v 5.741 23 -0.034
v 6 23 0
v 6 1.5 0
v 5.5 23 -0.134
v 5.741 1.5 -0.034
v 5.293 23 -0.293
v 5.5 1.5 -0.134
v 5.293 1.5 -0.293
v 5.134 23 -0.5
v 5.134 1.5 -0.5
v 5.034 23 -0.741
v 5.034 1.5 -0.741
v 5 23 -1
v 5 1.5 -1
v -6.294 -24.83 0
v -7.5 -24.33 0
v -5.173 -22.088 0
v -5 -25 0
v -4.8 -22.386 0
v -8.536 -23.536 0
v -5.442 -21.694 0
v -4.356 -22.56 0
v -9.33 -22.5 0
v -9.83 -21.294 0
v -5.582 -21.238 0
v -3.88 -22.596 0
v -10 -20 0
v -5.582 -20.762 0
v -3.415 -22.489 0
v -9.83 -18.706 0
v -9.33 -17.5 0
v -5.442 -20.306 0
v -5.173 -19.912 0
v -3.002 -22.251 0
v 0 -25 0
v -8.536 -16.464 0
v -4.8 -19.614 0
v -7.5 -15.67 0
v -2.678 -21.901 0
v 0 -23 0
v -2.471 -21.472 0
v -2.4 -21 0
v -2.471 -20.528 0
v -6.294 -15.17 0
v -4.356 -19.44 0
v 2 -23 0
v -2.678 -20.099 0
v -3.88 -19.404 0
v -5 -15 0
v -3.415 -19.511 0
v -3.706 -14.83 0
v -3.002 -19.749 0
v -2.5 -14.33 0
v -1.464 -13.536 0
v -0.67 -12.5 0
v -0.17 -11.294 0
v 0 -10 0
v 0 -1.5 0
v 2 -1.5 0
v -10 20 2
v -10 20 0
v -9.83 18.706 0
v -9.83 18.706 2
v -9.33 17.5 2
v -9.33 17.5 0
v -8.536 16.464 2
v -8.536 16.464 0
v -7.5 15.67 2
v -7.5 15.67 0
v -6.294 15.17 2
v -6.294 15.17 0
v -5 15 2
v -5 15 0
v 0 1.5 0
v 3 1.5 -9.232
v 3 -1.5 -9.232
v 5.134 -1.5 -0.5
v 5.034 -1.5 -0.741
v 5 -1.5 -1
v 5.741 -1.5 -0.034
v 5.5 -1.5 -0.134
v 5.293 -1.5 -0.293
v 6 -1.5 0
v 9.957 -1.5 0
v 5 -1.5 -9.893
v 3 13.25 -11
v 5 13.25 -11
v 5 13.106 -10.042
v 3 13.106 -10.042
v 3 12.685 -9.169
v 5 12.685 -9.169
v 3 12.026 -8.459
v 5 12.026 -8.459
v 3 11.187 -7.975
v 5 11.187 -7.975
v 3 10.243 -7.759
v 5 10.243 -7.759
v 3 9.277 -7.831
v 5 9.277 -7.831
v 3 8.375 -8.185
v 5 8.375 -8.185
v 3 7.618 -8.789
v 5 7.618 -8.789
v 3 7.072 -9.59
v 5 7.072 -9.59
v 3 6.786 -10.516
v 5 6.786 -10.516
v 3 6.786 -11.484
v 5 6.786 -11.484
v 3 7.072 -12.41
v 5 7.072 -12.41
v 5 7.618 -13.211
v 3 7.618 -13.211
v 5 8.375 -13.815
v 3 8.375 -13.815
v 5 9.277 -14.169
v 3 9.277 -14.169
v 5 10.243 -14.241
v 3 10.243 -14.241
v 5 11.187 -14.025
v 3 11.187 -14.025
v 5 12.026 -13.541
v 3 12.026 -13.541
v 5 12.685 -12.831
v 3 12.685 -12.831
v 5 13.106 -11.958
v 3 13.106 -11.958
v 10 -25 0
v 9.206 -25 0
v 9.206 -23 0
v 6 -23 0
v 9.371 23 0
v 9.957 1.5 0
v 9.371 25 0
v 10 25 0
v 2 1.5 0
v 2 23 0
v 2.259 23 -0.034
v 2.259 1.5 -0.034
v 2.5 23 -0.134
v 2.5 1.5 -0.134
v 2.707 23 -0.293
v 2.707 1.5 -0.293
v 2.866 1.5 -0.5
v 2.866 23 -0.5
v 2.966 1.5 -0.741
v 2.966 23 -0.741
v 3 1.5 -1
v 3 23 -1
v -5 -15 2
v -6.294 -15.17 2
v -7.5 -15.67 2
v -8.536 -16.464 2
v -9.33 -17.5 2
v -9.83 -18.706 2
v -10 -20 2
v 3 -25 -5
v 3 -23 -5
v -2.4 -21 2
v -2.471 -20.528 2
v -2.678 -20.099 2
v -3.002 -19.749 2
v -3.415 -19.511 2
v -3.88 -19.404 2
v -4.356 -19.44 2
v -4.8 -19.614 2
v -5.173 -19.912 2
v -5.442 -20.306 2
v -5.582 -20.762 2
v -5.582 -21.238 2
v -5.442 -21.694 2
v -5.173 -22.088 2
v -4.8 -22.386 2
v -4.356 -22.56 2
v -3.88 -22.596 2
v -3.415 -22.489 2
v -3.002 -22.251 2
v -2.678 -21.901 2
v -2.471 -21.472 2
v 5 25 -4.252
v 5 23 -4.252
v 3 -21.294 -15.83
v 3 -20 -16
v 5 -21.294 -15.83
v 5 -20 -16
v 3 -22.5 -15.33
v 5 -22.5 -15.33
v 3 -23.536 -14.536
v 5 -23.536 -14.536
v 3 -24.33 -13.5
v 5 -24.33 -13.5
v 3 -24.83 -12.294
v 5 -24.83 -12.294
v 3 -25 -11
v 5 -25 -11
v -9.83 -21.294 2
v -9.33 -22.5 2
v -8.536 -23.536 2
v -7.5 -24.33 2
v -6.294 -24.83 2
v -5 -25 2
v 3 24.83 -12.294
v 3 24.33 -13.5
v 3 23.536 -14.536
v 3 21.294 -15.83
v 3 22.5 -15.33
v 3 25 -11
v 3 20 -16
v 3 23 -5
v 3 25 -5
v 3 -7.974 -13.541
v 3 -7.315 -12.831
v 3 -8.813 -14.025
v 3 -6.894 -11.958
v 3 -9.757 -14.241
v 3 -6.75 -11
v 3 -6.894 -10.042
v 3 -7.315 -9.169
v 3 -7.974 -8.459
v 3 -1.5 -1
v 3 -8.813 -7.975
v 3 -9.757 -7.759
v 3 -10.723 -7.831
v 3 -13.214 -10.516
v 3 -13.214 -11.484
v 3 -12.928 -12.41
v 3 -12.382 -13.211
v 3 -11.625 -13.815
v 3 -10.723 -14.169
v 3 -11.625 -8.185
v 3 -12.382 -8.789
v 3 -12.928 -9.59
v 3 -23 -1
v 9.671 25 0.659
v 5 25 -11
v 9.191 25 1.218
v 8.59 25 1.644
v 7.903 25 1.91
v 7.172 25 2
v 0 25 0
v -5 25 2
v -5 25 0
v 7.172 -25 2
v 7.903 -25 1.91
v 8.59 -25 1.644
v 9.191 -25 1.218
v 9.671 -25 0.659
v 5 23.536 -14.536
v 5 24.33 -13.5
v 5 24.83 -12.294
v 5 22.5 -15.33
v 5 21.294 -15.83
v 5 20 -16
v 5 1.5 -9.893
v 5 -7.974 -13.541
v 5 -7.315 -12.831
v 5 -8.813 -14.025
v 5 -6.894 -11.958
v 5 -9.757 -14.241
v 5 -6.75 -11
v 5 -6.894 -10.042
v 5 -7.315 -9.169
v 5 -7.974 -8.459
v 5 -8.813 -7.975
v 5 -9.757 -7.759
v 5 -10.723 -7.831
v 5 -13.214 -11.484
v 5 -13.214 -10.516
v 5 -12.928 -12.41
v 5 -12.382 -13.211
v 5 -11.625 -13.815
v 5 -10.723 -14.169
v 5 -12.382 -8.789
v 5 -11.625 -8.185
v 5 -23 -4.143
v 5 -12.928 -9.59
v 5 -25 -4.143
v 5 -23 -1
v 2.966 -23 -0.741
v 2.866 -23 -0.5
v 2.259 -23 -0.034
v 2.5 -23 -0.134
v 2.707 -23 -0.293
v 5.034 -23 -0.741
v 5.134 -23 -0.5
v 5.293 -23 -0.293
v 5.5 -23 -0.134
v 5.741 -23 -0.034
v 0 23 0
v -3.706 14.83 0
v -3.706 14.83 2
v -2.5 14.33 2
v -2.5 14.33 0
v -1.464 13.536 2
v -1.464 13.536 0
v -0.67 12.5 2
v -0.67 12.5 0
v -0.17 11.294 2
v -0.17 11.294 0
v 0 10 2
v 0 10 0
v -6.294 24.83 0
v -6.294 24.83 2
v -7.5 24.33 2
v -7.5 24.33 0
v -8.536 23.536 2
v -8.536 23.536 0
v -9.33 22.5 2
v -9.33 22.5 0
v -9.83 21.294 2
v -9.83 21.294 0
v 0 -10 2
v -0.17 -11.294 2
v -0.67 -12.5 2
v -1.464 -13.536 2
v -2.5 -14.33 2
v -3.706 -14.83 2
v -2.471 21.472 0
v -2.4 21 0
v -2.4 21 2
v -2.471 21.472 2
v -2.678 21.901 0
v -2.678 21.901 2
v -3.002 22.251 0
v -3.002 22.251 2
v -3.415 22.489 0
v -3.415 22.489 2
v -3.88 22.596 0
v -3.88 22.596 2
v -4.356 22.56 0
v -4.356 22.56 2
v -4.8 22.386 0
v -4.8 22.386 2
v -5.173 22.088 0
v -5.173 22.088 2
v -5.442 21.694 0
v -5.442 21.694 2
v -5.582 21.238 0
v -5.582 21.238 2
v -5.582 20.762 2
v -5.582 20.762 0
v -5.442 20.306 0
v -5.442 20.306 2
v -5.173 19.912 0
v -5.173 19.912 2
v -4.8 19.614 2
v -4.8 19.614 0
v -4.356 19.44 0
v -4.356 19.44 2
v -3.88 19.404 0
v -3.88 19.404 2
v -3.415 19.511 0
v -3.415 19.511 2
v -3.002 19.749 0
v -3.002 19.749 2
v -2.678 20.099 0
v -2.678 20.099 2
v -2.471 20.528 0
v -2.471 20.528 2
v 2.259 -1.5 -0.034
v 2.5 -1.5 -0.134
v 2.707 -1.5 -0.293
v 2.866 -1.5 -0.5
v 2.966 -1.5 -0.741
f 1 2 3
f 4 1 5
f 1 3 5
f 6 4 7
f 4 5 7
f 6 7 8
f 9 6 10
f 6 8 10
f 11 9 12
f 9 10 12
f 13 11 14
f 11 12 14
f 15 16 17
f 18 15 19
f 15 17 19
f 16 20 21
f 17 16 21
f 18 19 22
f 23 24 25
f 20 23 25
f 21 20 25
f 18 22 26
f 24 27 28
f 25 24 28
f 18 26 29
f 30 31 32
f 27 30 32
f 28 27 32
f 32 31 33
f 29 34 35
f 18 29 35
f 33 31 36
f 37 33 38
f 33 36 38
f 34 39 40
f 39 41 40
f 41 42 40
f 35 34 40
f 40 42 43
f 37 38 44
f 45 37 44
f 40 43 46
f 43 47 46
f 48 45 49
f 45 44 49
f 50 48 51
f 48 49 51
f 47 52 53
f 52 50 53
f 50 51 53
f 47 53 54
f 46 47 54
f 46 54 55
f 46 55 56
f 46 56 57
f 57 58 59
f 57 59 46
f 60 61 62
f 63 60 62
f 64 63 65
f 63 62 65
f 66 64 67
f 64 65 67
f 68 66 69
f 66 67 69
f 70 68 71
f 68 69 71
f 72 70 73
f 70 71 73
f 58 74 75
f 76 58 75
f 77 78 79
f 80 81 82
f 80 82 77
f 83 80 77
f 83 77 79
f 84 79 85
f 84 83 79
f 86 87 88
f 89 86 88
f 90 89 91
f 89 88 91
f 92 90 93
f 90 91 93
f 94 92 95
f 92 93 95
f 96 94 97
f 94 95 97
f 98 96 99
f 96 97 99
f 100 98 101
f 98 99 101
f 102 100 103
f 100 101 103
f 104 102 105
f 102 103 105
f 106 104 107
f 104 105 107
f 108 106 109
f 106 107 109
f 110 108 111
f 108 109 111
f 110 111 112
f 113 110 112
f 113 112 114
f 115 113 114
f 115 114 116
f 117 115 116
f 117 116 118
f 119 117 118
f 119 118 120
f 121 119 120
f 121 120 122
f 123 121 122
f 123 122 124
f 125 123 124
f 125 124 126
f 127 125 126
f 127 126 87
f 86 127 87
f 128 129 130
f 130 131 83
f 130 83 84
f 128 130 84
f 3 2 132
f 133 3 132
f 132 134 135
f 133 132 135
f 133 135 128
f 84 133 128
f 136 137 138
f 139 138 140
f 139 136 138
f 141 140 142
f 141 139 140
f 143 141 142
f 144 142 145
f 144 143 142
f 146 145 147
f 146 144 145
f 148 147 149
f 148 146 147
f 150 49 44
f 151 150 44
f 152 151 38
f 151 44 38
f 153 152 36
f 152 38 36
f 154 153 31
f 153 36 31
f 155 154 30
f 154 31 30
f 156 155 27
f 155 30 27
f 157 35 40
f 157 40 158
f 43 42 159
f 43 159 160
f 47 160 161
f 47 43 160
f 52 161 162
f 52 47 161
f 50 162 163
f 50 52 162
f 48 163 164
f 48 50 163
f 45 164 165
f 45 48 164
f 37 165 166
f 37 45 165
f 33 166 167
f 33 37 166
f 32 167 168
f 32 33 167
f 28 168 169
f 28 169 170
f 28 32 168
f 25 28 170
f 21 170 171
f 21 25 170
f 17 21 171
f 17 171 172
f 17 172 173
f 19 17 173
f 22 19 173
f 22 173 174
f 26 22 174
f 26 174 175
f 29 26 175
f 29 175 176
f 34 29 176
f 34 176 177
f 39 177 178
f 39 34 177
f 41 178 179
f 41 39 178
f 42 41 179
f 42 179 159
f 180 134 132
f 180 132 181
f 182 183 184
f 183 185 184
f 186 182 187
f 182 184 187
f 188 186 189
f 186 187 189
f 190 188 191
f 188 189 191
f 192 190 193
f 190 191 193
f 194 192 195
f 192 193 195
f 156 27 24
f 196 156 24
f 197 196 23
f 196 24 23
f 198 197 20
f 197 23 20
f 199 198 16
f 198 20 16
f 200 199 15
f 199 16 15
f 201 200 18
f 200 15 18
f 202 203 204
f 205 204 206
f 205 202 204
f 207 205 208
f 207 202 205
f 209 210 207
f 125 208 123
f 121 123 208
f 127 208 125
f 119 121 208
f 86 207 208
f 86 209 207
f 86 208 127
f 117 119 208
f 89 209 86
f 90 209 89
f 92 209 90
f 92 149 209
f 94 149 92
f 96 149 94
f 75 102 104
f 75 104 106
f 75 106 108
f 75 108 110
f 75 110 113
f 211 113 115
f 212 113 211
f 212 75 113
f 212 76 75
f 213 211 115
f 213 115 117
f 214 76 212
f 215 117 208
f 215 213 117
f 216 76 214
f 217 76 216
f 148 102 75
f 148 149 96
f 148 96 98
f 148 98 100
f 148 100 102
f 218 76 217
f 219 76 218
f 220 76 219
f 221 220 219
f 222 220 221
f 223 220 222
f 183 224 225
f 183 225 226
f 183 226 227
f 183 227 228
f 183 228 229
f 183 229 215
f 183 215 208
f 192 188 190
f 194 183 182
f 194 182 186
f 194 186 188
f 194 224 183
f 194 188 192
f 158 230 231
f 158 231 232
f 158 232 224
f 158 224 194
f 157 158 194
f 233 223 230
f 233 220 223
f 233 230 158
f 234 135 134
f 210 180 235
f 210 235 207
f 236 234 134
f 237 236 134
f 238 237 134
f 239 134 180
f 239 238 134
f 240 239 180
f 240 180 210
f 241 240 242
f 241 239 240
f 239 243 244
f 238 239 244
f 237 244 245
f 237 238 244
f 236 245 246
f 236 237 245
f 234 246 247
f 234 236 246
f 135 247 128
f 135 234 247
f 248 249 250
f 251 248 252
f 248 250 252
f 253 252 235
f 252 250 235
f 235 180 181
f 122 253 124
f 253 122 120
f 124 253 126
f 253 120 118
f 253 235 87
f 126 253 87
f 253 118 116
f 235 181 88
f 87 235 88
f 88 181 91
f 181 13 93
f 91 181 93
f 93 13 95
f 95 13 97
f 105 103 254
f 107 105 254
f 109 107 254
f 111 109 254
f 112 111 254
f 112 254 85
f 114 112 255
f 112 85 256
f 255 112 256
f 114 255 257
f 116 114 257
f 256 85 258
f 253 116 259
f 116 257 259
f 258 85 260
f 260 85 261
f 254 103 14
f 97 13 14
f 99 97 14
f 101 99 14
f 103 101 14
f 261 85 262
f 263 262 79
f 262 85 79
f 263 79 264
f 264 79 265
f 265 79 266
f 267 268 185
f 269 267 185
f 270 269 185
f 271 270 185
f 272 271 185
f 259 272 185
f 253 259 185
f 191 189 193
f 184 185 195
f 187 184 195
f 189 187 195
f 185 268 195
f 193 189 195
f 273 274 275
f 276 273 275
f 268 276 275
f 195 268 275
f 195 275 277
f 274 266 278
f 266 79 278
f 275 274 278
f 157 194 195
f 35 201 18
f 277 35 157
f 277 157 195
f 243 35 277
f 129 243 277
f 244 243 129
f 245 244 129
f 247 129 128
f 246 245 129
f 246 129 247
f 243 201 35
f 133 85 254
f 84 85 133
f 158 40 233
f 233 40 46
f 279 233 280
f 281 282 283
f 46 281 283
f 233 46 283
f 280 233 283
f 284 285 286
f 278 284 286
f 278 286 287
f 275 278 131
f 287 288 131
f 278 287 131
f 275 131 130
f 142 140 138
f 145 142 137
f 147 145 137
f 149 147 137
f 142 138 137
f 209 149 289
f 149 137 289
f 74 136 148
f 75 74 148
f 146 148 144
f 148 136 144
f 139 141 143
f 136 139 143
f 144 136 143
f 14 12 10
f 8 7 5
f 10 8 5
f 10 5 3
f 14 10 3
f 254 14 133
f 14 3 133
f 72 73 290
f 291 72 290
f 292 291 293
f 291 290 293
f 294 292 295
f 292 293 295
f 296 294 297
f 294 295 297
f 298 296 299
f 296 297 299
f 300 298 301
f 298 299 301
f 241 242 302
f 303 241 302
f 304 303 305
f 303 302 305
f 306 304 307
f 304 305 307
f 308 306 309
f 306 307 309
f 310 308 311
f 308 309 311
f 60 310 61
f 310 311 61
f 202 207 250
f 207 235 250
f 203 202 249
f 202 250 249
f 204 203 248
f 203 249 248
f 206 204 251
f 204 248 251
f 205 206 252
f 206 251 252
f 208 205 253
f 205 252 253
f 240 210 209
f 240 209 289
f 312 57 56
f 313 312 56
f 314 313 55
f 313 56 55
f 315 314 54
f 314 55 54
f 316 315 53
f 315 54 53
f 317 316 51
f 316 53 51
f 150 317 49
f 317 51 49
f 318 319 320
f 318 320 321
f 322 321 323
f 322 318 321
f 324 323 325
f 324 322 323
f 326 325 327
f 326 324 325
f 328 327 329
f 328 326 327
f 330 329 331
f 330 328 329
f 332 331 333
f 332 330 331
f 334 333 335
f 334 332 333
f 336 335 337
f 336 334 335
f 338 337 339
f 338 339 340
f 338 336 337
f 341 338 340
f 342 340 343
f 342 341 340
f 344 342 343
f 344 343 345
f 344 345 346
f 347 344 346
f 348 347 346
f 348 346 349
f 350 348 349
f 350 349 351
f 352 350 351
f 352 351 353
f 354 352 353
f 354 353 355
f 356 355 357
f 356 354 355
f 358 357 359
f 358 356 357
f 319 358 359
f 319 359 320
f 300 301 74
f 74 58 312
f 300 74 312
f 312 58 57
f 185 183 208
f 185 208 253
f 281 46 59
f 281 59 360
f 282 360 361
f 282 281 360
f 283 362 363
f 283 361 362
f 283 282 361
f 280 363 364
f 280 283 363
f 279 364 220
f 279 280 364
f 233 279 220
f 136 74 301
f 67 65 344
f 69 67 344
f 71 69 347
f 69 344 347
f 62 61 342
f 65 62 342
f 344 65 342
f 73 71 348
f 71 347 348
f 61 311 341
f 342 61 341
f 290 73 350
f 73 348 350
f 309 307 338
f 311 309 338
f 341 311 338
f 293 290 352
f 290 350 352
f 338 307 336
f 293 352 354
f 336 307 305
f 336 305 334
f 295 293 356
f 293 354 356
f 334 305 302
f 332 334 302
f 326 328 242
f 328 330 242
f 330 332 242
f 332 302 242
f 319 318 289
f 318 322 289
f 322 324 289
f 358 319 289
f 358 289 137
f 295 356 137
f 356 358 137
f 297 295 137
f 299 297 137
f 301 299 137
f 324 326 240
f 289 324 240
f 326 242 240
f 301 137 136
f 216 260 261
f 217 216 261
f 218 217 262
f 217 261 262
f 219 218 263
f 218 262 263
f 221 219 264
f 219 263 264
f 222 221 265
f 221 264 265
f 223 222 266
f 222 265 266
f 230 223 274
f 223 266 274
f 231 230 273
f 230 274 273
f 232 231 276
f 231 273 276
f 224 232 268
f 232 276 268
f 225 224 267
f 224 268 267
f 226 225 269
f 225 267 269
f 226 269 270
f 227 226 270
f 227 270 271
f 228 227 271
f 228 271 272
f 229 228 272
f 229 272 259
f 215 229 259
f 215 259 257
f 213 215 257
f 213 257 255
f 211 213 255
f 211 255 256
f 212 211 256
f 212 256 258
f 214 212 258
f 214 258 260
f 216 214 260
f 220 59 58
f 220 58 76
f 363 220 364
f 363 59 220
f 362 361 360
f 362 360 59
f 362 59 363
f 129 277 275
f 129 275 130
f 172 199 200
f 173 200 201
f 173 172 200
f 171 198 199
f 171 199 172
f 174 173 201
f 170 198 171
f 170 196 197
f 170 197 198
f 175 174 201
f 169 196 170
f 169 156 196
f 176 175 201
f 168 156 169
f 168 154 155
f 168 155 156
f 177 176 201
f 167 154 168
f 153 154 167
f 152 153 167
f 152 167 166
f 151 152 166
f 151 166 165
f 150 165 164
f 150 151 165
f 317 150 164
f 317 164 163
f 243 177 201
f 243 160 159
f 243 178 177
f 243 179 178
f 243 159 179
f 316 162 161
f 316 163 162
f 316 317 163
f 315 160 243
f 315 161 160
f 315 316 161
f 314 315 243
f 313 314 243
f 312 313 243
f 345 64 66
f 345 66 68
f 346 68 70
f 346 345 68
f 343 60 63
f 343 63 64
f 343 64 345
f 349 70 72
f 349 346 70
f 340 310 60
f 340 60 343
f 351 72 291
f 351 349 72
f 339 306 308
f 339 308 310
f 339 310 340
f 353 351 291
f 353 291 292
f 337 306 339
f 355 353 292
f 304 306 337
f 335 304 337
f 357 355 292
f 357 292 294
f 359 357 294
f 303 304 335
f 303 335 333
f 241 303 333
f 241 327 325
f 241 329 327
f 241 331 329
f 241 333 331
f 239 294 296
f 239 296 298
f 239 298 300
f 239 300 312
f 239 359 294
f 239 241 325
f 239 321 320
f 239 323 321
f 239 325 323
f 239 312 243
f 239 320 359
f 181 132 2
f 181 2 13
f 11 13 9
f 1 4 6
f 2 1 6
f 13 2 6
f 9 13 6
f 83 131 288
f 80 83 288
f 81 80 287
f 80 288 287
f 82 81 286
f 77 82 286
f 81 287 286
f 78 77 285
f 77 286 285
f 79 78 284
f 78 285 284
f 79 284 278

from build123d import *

# Parameters (mm, degrees)
F0_R        = 1.6
F1_DEPTH    = 2
F2_W        = 2
F2_H        = 50
F3_DEPTH    = 16
F4_R        = 1
F5_T1_DEPTH = 64.1421356237
F6_R        = 3.25
F7_DEPTH    = 25
F8_R        = 5
F10_DEPTH   = 1.5
F12_DEPTH   = 2
F14_DEPTH   = 2


# Not quite as in the source:
# - a fillet or chamfer that OpenCascade refuses, or shapes differently, is made with other operations: its cross-section is extruded or revolved along the edge and cut away or added
# - a feature names something its author has since deleted; it is built from what else it names


with BuildPart() as f1:
    # F0 (on Top) → F1 (new body)
    with BuildSketch(Plane.XY):
        with BuildLine():
            Line((10, 25), (-5, 25))
            ThreePointArc((-5, 25), (-8.5355339059, 23.5355339059), (-10, 20))
            ThreePointArc((-10, 20), (-8.5355339059, 16.4644660941), (-5, 15))
            ThreePointArc((-5, 15), (-1.4644660941, 13.5355339059), (0, 10))
            Line((0, 10), (0, -10))
            ThreePointArc((0, -10), (-1.4644660941, -13.5355339059), (-5, -15))
            ThreePointArc((-5, -15), (-8.5355339059, -16.4644660941), (-10, -20))
            ThreePointArc((-10, -20), (-8.5355339059, -23.5355339059), (-5, -25))
            Line((-5, -25), (10, -25))
            Line((10, -25), (10, 25))
        make_face()
        with Locations((-4, -21)):
            Circle(F0_R, mode=Mode.SUBTRACT)
        with Locations((-4, 21)):
            Circle(F0_R, mode=Mode.SUBTRACT)
    extrude(amount=F1_DEPTH)

    # F2 (on face) → F3 (join)
    with BuildSketch(Plane(origin=(0, 0, 0), x_dir=(1, 0, 0), z_dir=(0, 0, -1))):
        with Locations((4, 0)):
            Rectangle(F2_W, F2_H)
    extrude(amount=F3_DEPTH)

    # F4
    f4_edges = [f1.edges().sort_by_distance(p)[0] for p in [
        (3, 0, 0),
        (5, 0, 0),
    ]]
    fillet(f4_edges, radius=F4_R)

    # F5: fillet of radius 3 on 1 edges, made by hand

    # F5_s2 → F5_t1 (cut)
    with BuildSketch(Plane.XZ.offset(-32.0710678119)):
        with BuildLine():
            ThreePointArc((7.1715728753, 2), (8.9036236828, 1.4494897428), (10, 0))
            Line((10, 0), (10, 2))
            Line((10, 2), (7.1715728753, 2))
        make_face()
    extrude(amount=F5_T1_DEPTH, mode=Mode.SUBTRACT)

    # F6 (on face) → F7 (cut)
    with BuildSketch(Plane.YZ.offset(5)):
        with Locations((-10, -11)):
            Circle(F6_R)
        with Locations((10, -11)):
            Circle(F6_R)
    extrude(amount=-F7_DEPTH, mode=Mode.SUBTRACT)

    # F8
    f8_edges = [f1.edges().sort_by_distance(p)[0] for p in [
        (4, -25, -16),
        (4, 25, -16),
    ]]
    fillet(f8_edges, radius=F8_R)

    # F9 (on Front) → F10 (join, symmetric)
    with BuildSketch(Plane.XZ):
        Polygon((3.4634403419, 0), (0, 0), (3.4634403419, -10.6586683542), align=None)
        Polygon((4.6165082604, -10.6586683542), (9.9565815181, 0), (4.6165082604, 0), align=None)
    extrude(amount=F10_DEPTH, both=True)

    # F11 (on face) → F12 (join)
    with BuildSketch(Plane(origin=(0, 25, 0), x_dir=(-1, 0, 0), z_dir=(0, 1, 0))):
        with BuildLine():
            Line((-3, -5), (0, 0))
            Line((0, 0), (-2, 0))
            ThreePointArc((-2, 0), (-2.7071067812, -0.2928932188), (-3, -1))
            Line((-3, -1), (-3, -5))
        make_face()
        with BuildLine():
            Line((-9.370720014, 0), (-5, -4.2517034346))
            Line((-5, -4.2517034346), (-5, -1))
            ThreePointArc((-5, -1), (-5.2928932188, -0.2928932188), (-6, 0))
            Line((-6, 0), (-9.370720014, 0))
        make_face()
    extrude(amount=-F12_DEPTH)

    # F13 (on face) → F14 (join)
    with BuildSketch(Plane.XZ.offset(25)):
        with BuildLine():
            Line((0, 0), (3, -5))
            Line((3, -5), (3, -1))
            ThreePointArc((3, -1), (2.7071067812, -0.2928932188), (2, 0))
            Line((2, 0), (0, 0))
        make_face()
        with BuildLine():
            Line((5, -1), (5, -4.1425118317))
            Line((5, -4.1425118317), (9.2058293521, 0))
            Line((9.2058293521, 0), (6, 0))
            ThreePointArc((6, 0), (5.2928932188, -0.2928932188), (5, -1))
        make_face()
    extrude(amount=-F14_DEPTH)


solid = f1.part
